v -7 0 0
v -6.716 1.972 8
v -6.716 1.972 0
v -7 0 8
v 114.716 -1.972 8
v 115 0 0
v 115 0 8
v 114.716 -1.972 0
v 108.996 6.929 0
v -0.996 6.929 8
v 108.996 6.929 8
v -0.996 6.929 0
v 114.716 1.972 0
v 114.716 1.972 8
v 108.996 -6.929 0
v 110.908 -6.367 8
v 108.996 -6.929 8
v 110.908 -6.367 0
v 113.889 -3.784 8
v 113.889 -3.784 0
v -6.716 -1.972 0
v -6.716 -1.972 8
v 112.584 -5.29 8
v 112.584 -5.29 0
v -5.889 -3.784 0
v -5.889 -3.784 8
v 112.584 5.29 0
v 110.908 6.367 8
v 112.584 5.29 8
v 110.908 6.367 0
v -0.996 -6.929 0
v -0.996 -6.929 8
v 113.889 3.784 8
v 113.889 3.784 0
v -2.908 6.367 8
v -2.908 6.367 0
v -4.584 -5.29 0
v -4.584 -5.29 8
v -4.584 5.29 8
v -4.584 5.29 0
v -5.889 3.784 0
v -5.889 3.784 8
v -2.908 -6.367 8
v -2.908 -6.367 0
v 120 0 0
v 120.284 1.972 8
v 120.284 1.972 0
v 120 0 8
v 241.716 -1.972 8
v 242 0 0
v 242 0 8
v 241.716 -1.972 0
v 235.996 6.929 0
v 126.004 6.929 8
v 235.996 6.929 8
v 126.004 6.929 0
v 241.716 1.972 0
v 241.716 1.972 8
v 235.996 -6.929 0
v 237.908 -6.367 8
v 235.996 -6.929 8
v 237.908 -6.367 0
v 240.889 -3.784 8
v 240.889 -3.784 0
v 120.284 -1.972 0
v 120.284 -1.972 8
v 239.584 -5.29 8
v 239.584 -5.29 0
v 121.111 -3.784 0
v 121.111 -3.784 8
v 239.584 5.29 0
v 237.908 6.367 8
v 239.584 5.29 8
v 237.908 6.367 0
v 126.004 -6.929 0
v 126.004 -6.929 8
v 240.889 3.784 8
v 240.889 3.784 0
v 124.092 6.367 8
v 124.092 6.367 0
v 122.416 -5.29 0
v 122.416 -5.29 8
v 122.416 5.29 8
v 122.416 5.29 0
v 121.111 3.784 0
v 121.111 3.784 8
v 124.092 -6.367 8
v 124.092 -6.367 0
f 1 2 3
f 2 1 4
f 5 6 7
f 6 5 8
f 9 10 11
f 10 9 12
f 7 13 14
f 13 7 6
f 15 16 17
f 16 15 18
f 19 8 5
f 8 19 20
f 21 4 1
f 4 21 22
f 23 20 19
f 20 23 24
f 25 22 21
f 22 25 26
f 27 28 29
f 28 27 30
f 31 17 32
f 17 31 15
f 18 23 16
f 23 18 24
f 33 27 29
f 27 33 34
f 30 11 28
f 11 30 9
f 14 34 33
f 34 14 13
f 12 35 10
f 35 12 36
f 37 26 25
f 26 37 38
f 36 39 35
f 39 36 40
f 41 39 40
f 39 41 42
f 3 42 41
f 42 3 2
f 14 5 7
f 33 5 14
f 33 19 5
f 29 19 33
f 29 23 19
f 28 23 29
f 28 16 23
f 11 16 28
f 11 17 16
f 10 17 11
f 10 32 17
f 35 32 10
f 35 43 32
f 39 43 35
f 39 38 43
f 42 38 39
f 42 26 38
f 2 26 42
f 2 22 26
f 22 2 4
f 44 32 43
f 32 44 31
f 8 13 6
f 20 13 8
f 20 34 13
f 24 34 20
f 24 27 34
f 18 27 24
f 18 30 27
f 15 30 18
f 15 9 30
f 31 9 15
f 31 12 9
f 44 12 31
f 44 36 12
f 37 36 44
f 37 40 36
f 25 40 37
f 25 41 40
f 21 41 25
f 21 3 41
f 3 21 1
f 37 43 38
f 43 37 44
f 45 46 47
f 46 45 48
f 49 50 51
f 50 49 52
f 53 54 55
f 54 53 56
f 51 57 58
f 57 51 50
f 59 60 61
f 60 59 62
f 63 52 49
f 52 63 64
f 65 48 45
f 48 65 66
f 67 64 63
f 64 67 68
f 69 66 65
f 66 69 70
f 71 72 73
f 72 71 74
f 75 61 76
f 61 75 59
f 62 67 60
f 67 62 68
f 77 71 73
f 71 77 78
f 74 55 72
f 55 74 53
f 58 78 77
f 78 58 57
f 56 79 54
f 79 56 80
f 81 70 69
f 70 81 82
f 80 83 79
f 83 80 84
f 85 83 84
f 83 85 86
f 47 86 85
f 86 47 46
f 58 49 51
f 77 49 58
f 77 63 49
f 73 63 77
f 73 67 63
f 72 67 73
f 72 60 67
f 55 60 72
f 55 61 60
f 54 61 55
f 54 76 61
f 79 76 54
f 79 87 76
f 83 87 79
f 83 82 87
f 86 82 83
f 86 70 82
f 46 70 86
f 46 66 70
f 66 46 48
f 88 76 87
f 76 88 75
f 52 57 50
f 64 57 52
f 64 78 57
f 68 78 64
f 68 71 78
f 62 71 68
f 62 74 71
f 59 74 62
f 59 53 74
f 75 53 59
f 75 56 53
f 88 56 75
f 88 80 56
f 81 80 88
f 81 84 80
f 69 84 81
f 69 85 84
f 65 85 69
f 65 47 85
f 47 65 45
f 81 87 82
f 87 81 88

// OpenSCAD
length = 122;
width = 14;
height = 8;

module piece() {
    hull() {
        cylinder(d=width,h=height);
        translate([length-width,0,0]) cylinder(d=width,h=height);
    }
}

piece();
translate([length+5,0,0]) piece();
